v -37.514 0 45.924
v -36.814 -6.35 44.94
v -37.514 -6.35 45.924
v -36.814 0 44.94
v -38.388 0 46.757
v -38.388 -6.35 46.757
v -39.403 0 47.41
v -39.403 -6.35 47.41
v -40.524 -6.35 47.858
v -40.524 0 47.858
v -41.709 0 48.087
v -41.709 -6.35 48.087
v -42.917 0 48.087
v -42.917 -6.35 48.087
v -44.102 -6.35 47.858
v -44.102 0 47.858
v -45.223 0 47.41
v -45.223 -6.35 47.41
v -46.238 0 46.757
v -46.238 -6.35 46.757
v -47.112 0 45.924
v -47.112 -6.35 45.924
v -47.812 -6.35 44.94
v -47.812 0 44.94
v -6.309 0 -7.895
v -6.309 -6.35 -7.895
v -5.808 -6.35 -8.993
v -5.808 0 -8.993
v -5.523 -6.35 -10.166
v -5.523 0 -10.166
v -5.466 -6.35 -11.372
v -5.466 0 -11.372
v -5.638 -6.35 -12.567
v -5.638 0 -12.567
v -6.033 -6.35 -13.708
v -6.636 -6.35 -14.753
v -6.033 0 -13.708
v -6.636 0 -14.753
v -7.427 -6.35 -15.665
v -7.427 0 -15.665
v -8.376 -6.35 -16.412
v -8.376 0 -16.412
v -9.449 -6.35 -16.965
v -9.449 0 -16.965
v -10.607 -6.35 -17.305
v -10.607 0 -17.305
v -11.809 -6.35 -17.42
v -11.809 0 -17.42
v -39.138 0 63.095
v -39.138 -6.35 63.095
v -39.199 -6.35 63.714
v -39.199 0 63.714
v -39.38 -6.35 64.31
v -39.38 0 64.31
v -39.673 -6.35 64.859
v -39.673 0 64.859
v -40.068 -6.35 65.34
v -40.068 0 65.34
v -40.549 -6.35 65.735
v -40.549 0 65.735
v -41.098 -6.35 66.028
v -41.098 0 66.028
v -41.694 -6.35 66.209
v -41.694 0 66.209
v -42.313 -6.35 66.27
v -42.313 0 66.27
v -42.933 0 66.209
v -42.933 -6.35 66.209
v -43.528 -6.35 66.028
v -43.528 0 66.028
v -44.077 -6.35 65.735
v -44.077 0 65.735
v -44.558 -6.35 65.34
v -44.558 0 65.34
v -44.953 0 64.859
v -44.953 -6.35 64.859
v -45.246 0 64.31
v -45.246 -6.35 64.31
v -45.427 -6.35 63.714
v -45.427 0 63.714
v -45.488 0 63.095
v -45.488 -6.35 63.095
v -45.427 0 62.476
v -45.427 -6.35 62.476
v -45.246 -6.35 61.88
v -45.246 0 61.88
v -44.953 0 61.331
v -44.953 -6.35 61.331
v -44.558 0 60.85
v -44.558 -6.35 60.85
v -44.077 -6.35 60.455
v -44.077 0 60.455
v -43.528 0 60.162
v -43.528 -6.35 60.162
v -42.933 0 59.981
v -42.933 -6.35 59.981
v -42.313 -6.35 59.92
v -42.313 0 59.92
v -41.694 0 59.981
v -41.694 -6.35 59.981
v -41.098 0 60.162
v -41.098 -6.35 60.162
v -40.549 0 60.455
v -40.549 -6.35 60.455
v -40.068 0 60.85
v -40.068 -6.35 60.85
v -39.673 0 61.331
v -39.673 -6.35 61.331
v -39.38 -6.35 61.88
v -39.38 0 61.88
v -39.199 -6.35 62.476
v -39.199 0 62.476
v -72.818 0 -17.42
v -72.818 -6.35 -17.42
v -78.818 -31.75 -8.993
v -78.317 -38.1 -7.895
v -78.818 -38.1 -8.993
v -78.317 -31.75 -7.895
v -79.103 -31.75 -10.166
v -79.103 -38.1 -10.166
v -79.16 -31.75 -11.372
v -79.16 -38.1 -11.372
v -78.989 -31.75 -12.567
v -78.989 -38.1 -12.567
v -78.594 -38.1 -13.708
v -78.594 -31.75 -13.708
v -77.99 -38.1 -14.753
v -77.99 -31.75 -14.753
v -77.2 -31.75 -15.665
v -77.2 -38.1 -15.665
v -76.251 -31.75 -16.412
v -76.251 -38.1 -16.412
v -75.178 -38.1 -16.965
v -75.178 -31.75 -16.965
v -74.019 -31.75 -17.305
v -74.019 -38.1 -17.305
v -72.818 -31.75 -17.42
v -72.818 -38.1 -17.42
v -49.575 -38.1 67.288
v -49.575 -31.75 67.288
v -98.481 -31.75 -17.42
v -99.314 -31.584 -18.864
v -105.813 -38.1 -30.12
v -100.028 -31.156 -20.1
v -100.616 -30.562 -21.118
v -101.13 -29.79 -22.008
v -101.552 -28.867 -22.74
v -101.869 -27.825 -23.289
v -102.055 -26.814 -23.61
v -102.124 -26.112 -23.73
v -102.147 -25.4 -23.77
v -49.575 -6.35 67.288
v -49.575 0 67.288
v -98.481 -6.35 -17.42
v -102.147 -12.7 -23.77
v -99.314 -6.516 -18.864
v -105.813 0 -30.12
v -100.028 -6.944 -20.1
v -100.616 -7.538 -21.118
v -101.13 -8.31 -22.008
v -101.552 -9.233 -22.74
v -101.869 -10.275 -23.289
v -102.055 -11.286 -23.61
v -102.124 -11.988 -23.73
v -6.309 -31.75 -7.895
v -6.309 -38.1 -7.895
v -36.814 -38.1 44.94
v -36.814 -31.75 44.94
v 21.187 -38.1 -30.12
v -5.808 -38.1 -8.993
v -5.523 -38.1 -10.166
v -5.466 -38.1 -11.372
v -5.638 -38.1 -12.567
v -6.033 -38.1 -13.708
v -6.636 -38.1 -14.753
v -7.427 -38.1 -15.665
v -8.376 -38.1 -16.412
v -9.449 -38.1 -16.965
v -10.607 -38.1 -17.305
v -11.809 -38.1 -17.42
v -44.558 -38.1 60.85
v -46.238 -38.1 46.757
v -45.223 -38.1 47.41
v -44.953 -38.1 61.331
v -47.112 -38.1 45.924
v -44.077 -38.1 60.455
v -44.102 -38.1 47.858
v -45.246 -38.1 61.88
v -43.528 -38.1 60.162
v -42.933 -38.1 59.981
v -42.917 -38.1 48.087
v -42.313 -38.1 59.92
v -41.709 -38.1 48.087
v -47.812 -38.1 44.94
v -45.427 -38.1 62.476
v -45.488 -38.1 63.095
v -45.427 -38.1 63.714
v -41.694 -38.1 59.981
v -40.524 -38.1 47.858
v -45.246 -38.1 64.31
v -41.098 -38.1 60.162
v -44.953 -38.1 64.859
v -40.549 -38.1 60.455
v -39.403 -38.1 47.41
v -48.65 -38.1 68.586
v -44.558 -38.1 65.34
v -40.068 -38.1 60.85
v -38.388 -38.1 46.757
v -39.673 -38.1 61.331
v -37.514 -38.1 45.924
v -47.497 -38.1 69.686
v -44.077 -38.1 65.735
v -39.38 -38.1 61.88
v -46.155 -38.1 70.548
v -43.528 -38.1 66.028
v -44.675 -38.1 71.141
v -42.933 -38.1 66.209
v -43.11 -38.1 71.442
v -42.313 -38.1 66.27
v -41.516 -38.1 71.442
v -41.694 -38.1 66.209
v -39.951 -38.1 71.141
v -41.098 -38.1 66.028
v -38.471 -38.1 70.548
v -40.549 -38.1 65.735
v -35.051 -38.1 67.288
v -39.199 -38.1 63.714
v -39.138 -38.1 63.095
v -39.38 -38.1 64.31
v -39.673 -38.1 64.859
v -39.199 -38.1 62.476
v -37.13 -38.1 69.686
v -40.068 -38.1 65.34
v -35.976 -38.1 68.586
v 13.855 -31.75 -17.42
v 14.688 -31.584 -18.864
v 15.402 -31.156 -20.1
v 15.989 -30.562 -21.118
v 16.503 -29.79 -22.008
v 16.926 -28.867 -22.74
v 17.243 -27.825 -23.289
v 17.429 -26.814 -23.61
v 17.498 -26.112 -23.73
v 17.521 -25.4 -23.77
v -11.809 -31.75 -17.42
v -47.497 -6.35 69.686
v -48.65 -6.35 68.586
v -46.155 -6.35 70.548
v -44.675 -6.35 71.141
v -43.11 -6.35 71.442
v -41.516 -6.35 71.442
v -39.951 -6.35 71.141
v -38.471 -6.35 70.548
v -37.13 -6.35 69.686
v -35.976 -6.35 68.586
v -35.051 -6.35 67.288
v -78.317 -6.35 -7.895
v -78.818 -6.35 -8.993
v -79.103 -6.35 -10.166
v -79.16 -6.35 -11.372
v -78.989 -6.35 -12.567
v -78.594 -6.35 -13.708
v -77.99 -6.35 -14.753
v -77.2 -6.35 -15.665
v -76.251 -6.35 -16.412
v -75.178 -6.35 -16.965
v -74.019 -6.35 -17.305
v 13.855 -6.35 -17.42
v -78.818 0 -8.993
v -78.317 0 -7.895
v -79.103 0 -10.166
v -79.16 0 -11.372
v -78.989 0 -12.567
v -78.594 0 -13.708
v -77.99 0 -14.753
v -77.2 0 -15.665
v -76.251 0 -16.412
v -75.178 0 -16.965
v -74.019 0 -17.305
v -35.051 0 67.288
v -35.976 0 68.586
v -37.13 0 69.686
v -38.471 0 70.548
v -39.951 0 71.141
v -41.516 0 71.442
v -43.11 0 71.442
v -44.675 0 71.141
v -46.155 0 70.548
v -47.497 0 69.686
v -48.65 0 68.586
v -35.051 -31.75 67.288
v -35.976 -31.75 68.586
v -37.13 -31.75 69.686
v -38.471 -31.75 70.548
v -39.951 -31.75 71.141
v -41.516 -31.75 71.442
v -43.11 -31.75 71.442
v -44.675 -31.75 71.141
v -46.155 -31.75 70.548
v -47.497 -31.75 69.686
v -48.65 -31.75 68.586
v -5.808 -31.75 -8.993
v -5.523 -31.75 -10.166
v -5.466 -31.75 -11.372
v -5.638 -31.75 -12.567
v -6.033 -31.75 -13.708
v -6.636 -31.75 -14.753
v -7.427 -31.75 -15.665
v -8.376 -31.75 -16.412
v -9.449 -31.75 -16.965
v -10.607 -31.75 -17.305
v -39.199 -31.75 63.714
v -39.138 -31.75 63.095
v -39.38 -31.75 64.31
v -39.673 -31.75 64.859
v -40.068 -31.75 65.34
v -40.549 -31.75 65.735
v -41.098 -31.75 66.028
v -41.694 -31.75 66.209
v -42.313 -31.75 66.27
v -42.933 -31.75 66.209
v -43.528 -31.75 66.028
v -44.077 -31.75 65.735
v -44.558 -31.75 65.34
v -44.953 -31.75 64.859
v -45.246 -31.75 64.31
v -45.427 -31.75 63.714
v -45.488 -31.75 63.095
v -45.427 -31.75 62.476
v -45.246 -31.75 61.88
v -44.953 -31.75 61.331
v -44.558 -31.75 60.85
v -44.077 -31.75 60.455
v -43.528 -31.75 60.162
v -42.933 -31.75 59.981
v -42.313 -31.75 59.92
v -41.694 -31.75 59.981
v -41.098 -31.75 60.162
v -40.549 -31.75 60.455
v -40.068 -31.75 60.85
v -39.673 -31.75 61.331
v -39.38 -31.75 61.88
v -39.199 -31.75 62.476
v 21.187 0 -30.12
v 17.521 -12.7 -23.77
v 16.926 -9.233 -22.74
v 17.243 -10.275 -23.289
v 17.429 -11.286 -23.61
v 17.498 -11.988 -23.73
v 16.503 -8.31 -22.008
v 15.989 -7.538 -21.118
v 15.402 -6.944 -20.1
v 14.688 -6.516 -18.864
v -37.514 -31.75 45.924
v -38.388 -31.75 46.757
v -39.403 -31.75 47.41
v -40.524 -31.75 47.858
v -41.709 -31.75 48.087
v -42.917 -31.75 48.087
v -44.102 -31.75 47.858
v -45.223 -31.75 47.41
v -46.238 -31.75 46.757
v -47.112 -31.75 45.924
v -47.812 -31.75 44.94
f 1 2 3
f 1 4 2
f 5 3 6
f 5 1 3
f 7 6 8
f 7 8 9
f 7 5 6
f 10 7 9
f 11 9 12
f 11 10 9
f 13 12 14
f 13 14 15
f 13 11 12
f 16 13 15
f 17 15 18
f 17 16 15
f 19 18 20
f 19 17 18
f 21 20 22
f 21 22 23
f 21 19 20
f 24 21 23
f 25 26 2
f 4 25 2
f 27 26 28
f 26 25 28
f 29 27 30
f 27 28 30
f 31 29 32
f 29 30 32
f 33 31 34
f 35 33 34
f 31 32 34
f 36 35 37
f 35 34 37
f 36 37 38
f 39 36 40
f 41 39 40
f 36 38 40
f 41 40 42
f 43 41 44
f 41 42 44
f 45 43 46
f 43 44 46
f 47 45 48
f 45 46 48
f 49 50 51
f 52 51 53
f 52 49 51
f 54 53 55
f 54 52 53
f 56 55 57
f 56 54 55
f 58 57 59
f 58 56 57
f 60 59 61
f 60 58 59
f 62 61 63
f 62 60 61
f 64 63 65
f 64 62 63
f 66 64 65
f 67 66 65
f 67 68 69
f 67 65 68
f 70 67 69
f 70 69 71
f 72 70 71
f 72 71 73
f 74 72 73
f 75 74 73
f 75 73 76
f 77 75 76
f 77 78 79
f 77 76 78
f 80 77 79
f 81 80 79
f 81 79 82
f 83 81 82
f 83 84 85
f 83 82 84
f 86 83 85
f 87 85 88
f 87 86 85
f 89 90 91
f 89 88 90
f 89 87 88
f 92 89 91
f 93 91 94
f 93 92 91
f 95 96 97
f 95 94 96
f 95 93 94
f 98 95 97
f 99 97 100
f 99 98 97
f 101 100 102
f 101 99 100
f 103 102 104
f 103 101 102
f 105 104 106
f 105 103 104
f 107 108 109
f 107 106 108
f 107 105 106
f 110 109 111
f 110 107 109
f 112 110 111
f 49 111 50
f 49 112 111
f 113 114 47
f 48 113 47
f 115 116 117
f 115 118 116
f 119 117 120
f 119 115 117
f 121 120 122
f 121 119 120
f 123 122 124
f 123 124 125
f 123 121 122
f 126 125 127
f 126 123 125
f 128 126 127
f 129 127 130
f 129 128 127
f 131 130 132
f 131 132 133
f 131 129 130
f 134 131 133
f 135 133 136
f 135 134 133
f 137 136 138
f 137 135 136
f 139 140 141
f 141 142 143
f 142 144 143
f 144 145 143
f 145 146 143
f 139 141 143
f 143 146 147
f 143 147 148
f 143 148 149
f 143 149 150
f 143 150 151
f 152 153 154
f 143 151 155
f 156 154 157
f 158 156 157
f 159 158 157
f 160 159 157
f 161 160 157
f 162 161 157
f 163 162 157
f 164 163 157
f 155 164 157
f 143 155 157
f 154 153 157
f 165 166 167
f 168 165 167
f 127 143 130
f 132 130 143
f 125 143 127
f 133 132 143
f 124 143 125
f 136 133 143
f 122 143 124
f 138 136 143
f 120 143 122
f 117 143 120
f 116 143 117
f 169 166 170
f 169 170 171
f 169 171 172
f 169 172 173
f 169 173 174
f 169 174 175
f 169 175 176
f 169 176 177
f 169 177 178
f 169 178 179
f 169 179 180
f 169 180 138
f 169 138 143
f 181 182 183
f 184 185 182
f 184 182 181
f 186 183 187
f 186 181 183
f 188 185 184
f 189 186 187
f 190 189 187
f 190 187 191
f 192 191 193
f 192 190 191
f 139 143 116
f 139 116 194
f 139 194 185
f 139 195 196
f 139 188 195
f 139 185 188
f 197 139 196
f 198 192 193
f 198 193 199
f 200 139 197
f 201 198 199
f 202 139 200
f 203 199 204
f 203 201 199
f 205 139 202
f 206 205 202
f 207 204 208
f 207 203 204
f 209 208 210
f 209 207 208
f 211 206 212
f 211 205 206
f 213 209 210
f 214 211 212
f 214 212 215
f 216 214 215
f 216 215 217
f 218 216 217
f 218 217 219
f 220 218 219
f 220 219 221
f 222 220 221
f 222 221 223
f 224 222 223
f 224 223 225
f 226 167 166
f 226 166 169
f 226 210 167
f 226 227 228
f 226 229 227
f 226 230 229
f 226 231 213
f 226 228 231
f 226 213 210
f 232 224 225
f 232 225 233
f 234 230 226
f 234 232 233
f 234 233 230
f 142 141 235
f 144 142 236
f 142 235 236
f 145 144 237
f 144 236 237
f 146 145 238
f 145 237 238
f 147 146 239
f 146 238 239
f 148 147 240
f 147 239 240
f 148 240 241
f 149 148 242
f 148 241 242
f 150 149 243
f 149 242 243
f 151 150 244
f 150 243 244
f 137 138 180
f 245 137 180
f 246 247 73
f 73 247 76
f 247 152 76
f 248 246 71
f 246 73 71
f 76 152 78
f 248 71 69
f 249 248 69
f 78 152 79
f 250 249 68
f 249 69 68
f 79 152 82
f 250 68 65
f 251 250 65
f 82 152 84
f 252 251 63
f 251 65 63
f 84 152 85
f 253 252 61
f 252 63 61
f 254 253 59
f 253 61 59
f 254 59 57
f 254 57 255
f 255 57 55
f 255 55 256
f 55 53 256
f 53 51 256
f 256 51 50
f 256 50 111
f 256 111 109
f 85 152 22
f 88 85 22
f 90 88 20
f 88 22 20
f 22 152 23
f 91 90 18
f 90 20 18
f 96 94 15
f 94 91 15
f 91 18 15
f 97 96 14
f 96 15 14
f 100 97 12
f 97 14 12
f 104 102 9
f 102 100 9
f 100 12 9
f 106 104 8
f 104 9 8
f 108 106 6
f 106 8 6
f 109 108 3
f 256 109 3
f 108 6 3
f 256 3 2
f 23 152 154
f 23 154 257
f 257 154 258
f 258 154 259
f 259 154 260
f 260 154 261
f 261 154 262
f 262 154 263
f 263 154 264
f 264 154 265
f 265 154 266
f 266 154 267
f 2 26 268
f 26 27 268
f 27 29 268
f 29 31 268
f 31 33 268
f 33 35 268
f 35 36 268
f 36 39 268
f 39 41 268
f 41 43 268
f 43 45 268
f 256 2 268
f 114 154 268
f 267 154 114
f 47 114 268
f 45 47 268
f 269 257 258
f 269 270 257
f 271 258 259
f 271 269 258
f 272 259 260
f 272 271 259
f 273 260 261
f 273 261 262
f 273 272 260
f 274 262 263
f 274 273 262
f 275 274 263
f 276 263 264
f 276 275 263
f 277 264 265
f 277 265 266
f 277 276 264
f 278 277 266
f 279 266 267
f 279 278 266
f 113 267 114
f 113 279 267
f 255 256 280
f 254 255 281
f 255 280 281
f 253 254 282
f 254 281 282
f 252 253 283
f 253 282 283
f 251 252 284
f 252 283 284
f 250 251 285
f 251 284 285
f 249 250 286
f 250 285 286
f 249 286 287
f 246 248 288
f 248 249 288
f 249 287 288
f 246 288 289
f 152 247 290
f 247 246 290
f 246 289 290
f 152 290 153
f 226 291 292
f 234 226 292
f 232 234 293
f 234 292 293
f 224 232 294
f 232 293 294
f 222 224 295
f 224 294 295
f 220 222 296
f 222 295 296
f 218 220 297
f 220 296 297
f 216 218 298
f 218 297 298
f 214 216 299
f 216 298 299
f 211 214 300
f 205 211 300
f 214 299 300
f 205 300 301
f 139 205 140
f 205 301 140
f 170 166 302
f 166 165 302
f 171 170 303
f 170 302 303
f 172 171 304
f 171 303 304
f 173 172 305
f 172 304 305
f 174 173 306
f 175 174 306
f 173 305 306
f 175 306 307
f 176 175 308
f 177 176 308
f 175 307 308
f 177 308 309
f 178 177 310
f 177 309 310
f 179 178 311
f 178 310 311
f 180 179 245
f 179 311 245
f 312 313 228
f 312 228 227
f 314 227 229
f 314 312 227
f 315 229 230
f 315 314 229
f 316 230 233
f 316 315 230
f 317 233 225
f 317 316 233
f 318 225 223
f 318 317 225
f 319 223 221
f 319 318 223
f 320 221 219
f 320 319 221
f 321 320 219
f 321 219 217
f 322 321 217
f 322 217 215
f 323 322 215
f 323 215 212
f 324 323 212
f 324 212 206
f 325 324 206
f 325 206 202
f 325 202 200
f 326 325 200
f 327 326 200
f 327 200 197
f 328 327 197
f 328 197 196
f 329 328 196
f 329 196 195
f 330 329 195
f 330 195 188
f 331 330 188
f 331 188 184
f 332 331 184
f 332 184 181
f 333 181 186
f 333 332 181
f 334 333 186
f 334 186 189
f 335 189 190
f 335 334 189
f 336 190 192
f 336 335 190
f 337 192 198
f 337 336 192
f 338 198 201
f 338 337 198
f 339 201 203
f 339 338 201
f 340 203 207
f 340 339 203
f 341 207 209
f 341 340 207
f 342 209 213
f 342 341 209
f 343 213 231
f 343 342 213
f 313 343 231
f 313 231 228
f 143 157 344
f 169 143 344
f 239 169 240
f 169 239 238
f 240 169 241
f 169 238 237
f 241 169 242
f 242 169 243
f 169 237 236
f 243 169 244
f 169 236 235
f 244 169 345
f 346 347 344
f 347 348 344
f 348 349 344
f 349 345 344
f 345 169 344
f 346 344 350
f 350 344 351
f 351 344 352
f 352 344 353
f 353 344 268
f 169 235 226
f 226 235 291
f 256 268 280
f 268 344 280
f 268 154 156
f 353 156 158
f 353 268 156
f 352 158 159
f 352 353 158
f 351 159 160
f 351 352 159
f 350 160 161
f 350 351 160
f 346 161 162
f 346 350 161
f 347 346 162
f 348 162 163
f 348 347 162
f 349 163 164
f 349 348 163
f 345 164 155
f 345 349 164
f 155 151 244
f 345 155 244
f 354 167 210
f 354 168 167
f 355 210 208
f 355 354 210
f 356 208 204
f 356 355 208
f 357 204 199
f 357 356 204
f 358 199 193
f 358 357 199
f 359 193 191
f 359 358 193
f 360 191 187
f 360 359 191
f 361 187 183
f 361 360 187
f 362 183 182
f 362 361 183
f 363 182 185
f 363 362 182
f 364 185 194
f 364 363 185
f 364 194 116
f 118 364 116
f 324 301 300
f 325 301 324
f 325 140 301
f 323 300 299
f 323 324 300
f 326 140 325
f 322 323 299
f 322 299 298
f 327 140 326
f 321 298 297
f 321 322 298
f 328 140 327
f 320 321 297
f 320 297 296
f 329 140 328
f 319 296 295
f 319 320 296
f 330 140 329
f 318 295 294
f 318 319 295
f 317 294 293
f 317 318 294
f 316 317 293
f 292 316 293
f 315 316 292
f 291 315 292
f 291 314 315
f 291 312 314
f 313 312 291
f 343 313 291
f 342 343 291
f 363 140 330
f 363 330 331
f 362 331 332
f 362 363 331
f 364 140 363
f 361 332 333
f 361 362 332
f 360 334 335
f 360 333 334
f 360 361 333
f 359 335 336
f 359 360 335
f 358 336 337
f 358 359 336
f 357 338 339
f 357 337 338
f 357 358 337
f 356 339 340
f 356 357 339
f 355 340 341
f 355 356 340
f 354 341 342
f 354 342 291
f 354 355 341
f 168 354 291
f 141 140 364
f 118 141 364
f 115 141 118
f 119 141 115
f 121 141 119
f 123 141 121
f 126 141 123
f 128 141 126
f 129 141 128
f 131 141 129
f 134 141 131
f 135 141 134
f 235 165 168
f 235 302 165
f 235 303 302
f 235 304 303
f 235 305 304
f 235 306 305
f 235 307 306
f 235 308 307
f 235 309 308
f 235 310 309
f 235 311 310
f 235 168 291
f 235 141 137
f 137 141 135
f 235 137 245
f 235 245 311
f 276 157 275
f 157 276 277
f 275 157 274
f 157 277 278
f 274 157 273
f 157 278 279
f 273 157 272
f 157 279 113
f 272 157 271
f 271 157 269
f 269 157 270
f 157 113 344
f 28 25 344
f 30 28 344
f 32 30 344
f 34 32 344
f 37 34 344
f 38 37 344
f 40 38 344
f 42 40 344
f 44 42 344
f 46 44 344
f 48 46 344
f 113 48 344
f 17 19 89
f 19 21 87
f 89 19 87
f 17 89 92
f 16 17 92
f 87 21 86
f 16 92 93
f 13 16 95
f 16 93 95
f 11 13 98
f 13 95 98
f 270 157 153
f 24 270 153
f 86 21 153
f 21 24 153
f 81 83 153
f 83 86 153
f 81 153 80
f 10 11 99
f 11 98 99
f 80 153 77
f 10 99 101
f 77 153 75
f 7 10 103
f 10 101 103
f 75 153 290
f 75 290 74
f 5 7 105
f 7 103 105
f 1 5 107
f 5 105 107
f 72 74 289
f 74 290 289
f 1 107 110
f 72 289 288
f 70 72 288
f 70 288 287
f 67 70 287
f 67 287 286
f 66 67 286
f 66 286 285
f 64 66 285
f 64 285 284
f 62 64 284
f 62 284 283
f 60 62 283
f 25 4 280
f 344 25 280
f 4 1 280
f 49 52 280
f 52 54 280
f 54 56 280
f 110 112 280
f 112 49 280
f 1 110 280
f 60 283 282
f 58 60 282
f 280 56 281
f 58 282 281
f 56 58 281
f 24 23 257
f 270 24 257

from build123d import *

# Parameters (mm, degrees)
F0_R     = 3.175
F1_DEPTH = 38.1
F3_W     = 127
F3_H     = 25.4
F4_DEPTH = 95.251
F6_DEPTH = 38.101
F7_R     = 6.35
F8_R     = 6.34999


# Not quite as in the source:
# - a fillet or chamfer is up to 0.001 mm smaller than in the source, because OpenCascade refuses the exact size


with BuildPart() as f1:
    # F0 (on Front) → F1 (new body)
    with BuildSketch(Plane.XZ):
        with BuildLine():
            Line((-49.5749215348, 67.2876468139), (-105.8131025593, -30.1197400458))
            Line((-105.8131025593, -30.1197400458), (21.1868974407, -30.1197400458))
            Line((21.1868974407, -30.1197400458), (-35.0512835838, 67.2876468139))
            ThreePointArc((-35.0512835838, 67.2876468139), (-42.3131025593, 71.4802599542), (-49.5749215348, 67.2876468139))
        make_face()
        with Locations((-42.3131025593, 63.0950336736)):
            Circle(F0_R, mode=Mode.SUBTRACT)
    extrude(amount=F1_DEPTH)

    # F3 (on offset) → F4 (cut, through all)
    with BuildSketch(Plane(origin=(0, 0, -23.7697400458), x_dir=(1, 0, 0), z_dir=(0, 0, -1))):
        with Locations((-42.3131025593, 19.05)):
            Rectangle(F3_W, F3_H)
    extrude(amount=-F4_DEPTH, mode=Mode.SUBTRACT)

    # F5 (on face) → F6 (cut, through all)
    with BuildSketch(Plane.XZ.offset(38.1)):
        Polygon((-0.8101478154, -17.4197400458), (-42.3131025593, 54.4654862348), (-83.8160573032, -17.4197400458), align=None)
    extrude(amount=-F6_DEPTH, mode=Mode.SUBTRACT)

    # F7
    f7_edges = [f1.edges().sort_by_distance(p)[0] for p in [
        (-42.313103, -34.925, 54.465486),
        (-83.816057, -34.925, -17.41974),
        (-0.810148, -34.925, -17.41974),
        (-0.810148, -3.175, -17.41974),
        (-83.816057, -3.175, -17.41974),
        (-42.313103, -3.175, 54.465486),
    ]]
    fillet(f7_edges, radius=F7_R)

    # F8 (radius 6.35 in the source; OpenCascade refuses exactly that, so slightly less here)
    f8_edges = [f1.edges().sort_by_distance(p)[0] for p in [
        (-42.313103, -6.35, -23.76974),
        (-42.313103, -31.75, -23.76974),
    ]]
    fillet(f8_edges, radius=F8_R)


solid = f1.part
